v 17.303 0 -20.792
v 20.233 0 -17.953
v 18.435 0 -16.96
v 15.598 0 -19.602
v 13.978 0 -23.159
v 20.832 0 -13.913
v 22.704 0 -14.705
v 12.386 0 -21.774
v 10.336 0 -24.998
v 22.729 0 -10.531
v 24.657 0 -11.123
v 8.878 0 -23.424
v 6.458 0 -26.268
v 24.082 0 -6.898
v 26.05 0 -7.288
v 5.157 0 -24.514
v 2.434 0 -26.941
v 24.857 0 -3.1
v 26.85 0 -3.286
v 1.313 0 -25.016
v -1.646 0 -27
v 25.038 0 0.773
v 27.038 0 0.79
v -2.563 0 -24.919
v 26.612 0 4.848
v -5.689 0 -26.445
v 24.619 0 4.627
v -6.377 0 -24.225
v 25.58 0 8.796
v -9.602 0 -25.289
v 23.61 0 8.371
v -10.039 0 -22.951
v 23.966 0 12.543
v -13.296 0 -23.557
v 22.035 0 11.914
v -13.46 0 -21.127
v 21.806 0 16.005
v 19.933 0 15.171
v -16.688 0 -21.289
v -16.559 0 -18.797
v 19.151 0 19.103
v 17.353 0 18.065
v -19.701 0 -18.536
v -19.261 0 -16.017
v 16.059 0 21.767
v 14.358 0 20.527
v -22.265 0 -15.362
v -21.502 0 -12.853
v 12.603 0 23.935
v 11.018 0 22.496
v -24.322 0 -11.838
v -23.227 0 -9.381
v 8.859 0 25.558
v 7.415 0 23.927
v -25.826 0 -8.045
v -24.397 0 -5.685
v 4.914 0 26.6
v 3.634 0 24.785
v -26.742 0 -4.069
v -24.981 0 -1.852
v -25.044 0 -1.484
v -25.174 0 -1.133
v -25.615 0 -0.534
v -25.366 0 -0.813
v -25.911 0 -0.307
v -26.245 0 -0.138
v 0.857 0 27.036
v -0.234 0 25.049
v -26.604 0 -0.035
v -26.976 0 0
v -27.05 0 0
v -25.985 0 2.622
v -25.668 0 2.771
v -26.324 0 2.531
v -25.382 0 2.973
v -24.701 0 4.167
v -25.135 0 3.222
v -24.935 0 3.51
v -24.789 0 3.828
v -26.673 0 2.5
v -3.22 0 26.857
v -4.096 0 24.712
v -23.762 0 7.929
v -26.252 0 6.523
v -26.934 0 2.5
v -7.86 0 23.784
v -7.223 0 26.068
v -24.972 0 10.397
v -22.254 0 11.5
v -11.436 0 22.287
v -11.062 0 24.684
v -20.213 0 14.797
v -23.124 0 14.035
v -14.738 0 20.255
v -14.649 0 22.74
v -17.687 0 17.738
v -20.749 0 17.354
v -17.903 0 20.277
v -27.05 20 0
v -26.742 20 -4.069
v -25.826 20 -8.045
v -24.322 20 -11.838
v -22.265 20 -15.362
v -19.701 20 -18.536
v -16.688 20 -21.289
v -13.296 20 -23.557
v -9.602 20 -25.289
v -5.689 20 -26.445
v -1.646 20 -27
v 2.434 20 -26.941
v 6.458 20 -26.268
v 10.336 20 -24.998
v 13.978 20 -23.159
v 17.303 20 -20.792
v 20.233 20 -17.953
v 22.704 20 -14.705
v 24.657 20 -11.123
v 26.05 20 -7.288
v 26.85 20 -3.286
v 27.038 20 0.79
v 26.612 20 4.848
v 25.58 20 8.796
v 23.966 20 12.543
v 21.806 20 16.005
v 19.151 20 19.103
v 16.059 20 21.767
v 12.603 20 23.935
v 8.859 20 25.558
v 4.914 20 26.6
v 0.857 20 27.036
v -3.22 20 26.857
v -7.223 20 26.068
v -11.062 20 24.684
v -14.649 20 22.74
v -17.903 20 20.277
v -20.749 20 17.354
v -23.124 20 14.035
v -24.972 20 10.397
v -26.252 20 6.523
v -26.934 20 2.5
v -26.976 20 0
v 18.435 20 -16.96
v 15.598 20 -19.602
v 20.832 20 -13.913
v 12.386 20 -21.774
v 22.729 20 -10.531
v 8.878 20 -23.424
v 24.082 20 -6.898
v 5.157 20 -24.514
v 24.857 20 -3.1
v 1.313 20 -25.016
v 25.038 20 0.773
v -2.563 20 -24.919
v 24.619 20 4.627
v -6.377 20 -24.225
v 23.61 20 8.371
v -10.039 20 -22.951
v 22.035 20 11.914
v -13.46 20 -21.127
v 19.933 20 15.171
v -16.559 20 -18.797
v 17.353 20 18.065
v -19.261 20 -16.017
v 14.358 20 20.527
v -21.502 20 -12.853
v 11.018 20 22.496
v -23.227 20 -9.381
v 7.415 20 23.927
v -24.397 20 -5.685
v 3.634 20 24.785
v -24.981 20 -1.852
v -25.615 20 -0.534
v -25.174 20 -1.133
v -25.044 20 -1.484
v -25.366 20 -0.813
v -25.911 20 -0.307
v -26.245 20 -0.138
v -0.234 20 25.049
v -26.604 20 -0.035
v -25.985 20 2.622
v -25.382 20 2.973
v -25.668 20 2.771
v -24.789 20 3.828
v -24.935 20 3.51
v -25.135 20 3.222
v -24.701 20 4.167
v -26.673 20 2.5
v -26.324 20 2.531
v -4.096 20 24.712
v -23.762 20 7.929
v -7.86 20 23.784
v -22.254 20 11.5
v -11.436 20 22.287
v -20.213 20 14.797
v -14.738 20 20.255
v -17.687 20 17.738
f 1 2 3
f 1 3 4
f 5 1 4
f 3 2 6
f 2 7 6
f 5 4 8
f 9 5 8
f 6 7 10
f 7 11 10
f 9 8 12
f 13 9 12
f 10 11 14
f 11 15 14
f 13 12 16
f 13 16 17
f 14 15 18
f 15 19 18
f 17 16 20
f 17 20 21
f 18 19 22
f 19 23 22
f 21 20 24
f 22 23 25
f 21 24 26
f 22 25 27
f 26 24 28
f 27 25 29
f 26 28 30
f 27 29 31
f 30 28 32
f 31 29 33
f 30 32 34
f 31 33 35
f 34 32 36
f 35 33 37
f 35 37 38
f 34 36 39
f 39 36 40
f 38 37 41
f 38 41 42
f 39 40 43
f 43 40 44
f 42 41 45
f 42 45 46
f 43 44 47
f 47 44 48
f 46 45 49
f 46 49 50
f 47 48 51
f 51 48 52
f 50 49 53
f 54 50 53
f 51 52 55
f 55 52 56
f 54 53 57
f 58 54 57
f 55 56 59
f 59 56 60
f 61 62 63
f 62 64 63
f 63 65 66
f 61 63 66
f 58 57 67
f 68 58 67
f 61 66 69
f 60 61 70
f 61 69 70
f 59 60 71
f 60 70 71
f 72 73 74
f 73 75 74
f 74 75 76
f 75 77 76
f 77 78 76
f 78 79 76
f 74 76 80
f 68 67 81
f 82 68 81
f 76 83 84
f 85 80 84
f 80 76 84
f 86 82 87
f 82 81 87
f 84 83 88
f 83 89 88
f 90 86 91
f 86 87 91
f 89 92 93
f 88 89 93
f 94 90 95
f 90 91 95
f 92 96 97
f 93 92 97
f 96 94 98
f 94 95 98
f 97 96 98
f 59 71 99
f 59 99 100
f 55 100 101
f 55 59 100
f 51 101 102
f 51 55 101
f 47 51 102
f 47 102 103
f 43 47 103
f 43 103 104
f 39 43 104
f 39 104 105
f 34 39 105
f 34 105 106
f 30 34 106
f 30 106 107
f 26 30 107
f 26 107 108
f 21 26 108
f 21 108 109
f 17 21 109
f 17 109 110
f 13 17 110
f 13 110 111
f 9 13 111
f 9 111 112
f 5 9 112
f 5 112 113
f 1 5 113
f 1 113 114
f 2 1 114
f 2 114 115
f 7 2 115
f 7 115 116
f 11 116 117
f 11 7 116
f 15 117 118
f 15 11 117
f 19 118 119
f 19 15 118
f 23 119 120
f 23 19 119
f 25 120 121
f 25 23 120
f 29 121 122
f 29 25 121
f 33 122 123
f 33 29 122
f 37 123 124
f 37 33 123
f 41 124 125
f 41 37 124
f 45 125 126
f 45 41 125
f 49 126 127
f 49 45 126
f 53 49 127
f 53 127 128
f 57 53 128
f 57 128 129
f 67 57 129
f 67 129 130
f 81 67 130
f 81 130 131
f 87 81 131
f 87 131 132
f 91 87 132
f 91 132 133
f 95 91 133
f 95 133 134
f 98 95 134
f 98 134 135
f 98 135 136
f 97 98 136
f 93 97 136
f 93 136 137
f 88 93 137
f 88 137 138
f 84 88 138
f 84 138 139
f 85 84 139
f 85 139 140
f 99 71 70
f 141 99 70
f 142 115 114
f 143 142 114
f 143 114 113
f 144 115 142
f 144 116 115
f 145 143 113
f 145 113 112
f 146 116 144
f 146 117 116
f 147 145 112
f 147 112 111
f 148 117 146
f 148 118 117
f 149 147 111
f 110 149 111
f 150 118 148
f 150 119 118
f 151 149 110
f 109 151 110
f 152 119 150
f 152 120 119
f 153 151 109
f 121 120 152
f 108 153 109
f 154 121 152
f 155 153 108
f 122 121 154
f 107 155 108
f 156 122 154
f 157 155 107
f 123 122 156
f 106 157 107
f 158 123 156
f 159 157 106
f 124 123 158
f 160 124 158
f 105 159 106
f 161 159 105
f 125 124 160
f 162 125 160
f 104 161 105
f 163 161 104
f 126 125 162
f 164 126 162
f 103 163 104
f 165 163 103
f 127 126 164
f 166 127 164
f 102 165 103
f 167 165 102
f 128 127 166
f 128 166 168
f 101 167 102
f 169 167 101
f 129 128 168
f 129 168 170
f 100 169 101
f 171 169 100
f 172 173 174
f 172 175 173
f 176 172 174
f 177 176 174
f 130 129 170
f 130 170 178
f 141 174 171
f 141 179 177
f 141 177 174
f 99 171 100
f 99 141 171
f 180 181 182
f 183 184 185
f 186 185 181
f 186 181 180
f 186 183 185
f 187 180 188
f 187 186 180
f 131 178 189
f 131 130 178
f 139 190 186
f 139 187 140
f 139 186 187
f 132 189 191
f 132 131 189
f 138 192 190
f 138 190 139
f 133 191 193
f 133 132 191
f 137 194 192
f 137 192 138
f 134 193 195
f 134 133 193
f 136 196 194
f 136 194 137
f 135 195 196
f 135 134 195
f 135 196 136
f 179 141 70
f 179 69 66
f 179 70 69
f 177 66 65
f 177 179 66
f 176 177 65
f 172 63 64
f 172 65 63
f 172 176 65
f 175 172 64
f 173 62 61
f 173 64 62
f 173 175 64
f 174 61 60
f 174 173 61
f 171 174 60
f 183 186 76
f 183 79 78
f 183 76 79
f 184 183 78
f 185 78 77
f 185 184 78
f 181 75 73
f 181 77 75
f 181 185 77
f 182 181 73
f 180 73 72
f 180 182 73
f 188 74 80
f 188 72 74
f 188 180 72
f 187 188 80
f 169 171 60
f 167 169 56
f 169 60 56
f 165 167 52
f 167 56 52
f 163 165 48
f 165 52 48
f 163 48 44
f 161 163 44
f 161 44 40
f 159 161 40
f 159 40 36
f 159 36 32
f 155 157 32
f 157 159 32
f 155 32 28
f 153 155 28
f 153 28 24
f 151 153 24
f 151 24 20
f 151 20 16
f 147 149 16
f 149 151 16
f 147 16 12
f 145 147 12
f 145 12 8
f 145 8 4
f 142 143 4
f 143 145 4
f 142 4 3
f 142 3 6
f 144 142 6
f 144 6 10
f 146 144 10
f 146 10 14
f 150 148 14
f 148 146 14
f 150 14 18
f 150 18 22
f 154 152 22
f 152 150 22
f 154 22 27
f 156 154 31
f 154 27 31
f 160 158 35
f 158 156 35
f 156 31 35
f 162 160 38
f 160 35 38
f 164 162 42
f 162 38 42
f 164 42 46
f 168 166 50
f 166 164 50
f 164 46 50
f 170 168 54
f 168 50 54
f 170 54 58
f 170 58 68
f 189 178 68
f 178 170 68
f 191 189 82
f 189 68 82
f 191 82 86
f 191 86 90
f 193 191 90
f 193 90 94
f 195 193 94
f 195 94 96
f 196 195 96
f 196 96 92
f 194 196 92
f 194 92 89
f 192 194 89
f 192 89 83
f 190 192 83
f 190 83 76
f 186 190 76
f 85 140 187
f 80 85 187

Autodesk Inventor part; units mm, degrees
ref_plane "YZ Plane" through (0, 0, 0) normal (1, 0, 0) x (0, 1, 0)
ref_plane "XZ Plane" through (0, 0, 0) normal (0, 1, 0) x (-1, 0, 0)
ref_plane "XY Plane" through (0, 0, 0) normal (0, 0, 1) x (1, 0, 0)
sketch "スケッチ1" plane through (0, 0, 0) normal (0, 1, 0) x (-1, 0, 0)
  arc A0 (26.9342, 2.5) -> (27.05, 0) centre (0, 0) ccw
  arc A1 (24.9249, 2.5) -> (25.05, 0) centre (0, 0) ccw
  line L0 (26.9342, 2.5) -> (24.9249, 2.5)
  line L1 (39.5466, 0) -> (-39.5755, 0) projected
  dimension "d0" = 25.05
  dimension "d1" = 2
  dimension "d2" = 2.5
extrude "押し出し1" add sketch "スケッチ1" along normal blind 20 contours L0 A1 L1 A0 | L1 A1 A0
fillet "フィレット1" radius 2 2 edges at (-25.05, 10, 0) (-24.9249, 10, 2.5)
properties part number "Senban_zigu2"
